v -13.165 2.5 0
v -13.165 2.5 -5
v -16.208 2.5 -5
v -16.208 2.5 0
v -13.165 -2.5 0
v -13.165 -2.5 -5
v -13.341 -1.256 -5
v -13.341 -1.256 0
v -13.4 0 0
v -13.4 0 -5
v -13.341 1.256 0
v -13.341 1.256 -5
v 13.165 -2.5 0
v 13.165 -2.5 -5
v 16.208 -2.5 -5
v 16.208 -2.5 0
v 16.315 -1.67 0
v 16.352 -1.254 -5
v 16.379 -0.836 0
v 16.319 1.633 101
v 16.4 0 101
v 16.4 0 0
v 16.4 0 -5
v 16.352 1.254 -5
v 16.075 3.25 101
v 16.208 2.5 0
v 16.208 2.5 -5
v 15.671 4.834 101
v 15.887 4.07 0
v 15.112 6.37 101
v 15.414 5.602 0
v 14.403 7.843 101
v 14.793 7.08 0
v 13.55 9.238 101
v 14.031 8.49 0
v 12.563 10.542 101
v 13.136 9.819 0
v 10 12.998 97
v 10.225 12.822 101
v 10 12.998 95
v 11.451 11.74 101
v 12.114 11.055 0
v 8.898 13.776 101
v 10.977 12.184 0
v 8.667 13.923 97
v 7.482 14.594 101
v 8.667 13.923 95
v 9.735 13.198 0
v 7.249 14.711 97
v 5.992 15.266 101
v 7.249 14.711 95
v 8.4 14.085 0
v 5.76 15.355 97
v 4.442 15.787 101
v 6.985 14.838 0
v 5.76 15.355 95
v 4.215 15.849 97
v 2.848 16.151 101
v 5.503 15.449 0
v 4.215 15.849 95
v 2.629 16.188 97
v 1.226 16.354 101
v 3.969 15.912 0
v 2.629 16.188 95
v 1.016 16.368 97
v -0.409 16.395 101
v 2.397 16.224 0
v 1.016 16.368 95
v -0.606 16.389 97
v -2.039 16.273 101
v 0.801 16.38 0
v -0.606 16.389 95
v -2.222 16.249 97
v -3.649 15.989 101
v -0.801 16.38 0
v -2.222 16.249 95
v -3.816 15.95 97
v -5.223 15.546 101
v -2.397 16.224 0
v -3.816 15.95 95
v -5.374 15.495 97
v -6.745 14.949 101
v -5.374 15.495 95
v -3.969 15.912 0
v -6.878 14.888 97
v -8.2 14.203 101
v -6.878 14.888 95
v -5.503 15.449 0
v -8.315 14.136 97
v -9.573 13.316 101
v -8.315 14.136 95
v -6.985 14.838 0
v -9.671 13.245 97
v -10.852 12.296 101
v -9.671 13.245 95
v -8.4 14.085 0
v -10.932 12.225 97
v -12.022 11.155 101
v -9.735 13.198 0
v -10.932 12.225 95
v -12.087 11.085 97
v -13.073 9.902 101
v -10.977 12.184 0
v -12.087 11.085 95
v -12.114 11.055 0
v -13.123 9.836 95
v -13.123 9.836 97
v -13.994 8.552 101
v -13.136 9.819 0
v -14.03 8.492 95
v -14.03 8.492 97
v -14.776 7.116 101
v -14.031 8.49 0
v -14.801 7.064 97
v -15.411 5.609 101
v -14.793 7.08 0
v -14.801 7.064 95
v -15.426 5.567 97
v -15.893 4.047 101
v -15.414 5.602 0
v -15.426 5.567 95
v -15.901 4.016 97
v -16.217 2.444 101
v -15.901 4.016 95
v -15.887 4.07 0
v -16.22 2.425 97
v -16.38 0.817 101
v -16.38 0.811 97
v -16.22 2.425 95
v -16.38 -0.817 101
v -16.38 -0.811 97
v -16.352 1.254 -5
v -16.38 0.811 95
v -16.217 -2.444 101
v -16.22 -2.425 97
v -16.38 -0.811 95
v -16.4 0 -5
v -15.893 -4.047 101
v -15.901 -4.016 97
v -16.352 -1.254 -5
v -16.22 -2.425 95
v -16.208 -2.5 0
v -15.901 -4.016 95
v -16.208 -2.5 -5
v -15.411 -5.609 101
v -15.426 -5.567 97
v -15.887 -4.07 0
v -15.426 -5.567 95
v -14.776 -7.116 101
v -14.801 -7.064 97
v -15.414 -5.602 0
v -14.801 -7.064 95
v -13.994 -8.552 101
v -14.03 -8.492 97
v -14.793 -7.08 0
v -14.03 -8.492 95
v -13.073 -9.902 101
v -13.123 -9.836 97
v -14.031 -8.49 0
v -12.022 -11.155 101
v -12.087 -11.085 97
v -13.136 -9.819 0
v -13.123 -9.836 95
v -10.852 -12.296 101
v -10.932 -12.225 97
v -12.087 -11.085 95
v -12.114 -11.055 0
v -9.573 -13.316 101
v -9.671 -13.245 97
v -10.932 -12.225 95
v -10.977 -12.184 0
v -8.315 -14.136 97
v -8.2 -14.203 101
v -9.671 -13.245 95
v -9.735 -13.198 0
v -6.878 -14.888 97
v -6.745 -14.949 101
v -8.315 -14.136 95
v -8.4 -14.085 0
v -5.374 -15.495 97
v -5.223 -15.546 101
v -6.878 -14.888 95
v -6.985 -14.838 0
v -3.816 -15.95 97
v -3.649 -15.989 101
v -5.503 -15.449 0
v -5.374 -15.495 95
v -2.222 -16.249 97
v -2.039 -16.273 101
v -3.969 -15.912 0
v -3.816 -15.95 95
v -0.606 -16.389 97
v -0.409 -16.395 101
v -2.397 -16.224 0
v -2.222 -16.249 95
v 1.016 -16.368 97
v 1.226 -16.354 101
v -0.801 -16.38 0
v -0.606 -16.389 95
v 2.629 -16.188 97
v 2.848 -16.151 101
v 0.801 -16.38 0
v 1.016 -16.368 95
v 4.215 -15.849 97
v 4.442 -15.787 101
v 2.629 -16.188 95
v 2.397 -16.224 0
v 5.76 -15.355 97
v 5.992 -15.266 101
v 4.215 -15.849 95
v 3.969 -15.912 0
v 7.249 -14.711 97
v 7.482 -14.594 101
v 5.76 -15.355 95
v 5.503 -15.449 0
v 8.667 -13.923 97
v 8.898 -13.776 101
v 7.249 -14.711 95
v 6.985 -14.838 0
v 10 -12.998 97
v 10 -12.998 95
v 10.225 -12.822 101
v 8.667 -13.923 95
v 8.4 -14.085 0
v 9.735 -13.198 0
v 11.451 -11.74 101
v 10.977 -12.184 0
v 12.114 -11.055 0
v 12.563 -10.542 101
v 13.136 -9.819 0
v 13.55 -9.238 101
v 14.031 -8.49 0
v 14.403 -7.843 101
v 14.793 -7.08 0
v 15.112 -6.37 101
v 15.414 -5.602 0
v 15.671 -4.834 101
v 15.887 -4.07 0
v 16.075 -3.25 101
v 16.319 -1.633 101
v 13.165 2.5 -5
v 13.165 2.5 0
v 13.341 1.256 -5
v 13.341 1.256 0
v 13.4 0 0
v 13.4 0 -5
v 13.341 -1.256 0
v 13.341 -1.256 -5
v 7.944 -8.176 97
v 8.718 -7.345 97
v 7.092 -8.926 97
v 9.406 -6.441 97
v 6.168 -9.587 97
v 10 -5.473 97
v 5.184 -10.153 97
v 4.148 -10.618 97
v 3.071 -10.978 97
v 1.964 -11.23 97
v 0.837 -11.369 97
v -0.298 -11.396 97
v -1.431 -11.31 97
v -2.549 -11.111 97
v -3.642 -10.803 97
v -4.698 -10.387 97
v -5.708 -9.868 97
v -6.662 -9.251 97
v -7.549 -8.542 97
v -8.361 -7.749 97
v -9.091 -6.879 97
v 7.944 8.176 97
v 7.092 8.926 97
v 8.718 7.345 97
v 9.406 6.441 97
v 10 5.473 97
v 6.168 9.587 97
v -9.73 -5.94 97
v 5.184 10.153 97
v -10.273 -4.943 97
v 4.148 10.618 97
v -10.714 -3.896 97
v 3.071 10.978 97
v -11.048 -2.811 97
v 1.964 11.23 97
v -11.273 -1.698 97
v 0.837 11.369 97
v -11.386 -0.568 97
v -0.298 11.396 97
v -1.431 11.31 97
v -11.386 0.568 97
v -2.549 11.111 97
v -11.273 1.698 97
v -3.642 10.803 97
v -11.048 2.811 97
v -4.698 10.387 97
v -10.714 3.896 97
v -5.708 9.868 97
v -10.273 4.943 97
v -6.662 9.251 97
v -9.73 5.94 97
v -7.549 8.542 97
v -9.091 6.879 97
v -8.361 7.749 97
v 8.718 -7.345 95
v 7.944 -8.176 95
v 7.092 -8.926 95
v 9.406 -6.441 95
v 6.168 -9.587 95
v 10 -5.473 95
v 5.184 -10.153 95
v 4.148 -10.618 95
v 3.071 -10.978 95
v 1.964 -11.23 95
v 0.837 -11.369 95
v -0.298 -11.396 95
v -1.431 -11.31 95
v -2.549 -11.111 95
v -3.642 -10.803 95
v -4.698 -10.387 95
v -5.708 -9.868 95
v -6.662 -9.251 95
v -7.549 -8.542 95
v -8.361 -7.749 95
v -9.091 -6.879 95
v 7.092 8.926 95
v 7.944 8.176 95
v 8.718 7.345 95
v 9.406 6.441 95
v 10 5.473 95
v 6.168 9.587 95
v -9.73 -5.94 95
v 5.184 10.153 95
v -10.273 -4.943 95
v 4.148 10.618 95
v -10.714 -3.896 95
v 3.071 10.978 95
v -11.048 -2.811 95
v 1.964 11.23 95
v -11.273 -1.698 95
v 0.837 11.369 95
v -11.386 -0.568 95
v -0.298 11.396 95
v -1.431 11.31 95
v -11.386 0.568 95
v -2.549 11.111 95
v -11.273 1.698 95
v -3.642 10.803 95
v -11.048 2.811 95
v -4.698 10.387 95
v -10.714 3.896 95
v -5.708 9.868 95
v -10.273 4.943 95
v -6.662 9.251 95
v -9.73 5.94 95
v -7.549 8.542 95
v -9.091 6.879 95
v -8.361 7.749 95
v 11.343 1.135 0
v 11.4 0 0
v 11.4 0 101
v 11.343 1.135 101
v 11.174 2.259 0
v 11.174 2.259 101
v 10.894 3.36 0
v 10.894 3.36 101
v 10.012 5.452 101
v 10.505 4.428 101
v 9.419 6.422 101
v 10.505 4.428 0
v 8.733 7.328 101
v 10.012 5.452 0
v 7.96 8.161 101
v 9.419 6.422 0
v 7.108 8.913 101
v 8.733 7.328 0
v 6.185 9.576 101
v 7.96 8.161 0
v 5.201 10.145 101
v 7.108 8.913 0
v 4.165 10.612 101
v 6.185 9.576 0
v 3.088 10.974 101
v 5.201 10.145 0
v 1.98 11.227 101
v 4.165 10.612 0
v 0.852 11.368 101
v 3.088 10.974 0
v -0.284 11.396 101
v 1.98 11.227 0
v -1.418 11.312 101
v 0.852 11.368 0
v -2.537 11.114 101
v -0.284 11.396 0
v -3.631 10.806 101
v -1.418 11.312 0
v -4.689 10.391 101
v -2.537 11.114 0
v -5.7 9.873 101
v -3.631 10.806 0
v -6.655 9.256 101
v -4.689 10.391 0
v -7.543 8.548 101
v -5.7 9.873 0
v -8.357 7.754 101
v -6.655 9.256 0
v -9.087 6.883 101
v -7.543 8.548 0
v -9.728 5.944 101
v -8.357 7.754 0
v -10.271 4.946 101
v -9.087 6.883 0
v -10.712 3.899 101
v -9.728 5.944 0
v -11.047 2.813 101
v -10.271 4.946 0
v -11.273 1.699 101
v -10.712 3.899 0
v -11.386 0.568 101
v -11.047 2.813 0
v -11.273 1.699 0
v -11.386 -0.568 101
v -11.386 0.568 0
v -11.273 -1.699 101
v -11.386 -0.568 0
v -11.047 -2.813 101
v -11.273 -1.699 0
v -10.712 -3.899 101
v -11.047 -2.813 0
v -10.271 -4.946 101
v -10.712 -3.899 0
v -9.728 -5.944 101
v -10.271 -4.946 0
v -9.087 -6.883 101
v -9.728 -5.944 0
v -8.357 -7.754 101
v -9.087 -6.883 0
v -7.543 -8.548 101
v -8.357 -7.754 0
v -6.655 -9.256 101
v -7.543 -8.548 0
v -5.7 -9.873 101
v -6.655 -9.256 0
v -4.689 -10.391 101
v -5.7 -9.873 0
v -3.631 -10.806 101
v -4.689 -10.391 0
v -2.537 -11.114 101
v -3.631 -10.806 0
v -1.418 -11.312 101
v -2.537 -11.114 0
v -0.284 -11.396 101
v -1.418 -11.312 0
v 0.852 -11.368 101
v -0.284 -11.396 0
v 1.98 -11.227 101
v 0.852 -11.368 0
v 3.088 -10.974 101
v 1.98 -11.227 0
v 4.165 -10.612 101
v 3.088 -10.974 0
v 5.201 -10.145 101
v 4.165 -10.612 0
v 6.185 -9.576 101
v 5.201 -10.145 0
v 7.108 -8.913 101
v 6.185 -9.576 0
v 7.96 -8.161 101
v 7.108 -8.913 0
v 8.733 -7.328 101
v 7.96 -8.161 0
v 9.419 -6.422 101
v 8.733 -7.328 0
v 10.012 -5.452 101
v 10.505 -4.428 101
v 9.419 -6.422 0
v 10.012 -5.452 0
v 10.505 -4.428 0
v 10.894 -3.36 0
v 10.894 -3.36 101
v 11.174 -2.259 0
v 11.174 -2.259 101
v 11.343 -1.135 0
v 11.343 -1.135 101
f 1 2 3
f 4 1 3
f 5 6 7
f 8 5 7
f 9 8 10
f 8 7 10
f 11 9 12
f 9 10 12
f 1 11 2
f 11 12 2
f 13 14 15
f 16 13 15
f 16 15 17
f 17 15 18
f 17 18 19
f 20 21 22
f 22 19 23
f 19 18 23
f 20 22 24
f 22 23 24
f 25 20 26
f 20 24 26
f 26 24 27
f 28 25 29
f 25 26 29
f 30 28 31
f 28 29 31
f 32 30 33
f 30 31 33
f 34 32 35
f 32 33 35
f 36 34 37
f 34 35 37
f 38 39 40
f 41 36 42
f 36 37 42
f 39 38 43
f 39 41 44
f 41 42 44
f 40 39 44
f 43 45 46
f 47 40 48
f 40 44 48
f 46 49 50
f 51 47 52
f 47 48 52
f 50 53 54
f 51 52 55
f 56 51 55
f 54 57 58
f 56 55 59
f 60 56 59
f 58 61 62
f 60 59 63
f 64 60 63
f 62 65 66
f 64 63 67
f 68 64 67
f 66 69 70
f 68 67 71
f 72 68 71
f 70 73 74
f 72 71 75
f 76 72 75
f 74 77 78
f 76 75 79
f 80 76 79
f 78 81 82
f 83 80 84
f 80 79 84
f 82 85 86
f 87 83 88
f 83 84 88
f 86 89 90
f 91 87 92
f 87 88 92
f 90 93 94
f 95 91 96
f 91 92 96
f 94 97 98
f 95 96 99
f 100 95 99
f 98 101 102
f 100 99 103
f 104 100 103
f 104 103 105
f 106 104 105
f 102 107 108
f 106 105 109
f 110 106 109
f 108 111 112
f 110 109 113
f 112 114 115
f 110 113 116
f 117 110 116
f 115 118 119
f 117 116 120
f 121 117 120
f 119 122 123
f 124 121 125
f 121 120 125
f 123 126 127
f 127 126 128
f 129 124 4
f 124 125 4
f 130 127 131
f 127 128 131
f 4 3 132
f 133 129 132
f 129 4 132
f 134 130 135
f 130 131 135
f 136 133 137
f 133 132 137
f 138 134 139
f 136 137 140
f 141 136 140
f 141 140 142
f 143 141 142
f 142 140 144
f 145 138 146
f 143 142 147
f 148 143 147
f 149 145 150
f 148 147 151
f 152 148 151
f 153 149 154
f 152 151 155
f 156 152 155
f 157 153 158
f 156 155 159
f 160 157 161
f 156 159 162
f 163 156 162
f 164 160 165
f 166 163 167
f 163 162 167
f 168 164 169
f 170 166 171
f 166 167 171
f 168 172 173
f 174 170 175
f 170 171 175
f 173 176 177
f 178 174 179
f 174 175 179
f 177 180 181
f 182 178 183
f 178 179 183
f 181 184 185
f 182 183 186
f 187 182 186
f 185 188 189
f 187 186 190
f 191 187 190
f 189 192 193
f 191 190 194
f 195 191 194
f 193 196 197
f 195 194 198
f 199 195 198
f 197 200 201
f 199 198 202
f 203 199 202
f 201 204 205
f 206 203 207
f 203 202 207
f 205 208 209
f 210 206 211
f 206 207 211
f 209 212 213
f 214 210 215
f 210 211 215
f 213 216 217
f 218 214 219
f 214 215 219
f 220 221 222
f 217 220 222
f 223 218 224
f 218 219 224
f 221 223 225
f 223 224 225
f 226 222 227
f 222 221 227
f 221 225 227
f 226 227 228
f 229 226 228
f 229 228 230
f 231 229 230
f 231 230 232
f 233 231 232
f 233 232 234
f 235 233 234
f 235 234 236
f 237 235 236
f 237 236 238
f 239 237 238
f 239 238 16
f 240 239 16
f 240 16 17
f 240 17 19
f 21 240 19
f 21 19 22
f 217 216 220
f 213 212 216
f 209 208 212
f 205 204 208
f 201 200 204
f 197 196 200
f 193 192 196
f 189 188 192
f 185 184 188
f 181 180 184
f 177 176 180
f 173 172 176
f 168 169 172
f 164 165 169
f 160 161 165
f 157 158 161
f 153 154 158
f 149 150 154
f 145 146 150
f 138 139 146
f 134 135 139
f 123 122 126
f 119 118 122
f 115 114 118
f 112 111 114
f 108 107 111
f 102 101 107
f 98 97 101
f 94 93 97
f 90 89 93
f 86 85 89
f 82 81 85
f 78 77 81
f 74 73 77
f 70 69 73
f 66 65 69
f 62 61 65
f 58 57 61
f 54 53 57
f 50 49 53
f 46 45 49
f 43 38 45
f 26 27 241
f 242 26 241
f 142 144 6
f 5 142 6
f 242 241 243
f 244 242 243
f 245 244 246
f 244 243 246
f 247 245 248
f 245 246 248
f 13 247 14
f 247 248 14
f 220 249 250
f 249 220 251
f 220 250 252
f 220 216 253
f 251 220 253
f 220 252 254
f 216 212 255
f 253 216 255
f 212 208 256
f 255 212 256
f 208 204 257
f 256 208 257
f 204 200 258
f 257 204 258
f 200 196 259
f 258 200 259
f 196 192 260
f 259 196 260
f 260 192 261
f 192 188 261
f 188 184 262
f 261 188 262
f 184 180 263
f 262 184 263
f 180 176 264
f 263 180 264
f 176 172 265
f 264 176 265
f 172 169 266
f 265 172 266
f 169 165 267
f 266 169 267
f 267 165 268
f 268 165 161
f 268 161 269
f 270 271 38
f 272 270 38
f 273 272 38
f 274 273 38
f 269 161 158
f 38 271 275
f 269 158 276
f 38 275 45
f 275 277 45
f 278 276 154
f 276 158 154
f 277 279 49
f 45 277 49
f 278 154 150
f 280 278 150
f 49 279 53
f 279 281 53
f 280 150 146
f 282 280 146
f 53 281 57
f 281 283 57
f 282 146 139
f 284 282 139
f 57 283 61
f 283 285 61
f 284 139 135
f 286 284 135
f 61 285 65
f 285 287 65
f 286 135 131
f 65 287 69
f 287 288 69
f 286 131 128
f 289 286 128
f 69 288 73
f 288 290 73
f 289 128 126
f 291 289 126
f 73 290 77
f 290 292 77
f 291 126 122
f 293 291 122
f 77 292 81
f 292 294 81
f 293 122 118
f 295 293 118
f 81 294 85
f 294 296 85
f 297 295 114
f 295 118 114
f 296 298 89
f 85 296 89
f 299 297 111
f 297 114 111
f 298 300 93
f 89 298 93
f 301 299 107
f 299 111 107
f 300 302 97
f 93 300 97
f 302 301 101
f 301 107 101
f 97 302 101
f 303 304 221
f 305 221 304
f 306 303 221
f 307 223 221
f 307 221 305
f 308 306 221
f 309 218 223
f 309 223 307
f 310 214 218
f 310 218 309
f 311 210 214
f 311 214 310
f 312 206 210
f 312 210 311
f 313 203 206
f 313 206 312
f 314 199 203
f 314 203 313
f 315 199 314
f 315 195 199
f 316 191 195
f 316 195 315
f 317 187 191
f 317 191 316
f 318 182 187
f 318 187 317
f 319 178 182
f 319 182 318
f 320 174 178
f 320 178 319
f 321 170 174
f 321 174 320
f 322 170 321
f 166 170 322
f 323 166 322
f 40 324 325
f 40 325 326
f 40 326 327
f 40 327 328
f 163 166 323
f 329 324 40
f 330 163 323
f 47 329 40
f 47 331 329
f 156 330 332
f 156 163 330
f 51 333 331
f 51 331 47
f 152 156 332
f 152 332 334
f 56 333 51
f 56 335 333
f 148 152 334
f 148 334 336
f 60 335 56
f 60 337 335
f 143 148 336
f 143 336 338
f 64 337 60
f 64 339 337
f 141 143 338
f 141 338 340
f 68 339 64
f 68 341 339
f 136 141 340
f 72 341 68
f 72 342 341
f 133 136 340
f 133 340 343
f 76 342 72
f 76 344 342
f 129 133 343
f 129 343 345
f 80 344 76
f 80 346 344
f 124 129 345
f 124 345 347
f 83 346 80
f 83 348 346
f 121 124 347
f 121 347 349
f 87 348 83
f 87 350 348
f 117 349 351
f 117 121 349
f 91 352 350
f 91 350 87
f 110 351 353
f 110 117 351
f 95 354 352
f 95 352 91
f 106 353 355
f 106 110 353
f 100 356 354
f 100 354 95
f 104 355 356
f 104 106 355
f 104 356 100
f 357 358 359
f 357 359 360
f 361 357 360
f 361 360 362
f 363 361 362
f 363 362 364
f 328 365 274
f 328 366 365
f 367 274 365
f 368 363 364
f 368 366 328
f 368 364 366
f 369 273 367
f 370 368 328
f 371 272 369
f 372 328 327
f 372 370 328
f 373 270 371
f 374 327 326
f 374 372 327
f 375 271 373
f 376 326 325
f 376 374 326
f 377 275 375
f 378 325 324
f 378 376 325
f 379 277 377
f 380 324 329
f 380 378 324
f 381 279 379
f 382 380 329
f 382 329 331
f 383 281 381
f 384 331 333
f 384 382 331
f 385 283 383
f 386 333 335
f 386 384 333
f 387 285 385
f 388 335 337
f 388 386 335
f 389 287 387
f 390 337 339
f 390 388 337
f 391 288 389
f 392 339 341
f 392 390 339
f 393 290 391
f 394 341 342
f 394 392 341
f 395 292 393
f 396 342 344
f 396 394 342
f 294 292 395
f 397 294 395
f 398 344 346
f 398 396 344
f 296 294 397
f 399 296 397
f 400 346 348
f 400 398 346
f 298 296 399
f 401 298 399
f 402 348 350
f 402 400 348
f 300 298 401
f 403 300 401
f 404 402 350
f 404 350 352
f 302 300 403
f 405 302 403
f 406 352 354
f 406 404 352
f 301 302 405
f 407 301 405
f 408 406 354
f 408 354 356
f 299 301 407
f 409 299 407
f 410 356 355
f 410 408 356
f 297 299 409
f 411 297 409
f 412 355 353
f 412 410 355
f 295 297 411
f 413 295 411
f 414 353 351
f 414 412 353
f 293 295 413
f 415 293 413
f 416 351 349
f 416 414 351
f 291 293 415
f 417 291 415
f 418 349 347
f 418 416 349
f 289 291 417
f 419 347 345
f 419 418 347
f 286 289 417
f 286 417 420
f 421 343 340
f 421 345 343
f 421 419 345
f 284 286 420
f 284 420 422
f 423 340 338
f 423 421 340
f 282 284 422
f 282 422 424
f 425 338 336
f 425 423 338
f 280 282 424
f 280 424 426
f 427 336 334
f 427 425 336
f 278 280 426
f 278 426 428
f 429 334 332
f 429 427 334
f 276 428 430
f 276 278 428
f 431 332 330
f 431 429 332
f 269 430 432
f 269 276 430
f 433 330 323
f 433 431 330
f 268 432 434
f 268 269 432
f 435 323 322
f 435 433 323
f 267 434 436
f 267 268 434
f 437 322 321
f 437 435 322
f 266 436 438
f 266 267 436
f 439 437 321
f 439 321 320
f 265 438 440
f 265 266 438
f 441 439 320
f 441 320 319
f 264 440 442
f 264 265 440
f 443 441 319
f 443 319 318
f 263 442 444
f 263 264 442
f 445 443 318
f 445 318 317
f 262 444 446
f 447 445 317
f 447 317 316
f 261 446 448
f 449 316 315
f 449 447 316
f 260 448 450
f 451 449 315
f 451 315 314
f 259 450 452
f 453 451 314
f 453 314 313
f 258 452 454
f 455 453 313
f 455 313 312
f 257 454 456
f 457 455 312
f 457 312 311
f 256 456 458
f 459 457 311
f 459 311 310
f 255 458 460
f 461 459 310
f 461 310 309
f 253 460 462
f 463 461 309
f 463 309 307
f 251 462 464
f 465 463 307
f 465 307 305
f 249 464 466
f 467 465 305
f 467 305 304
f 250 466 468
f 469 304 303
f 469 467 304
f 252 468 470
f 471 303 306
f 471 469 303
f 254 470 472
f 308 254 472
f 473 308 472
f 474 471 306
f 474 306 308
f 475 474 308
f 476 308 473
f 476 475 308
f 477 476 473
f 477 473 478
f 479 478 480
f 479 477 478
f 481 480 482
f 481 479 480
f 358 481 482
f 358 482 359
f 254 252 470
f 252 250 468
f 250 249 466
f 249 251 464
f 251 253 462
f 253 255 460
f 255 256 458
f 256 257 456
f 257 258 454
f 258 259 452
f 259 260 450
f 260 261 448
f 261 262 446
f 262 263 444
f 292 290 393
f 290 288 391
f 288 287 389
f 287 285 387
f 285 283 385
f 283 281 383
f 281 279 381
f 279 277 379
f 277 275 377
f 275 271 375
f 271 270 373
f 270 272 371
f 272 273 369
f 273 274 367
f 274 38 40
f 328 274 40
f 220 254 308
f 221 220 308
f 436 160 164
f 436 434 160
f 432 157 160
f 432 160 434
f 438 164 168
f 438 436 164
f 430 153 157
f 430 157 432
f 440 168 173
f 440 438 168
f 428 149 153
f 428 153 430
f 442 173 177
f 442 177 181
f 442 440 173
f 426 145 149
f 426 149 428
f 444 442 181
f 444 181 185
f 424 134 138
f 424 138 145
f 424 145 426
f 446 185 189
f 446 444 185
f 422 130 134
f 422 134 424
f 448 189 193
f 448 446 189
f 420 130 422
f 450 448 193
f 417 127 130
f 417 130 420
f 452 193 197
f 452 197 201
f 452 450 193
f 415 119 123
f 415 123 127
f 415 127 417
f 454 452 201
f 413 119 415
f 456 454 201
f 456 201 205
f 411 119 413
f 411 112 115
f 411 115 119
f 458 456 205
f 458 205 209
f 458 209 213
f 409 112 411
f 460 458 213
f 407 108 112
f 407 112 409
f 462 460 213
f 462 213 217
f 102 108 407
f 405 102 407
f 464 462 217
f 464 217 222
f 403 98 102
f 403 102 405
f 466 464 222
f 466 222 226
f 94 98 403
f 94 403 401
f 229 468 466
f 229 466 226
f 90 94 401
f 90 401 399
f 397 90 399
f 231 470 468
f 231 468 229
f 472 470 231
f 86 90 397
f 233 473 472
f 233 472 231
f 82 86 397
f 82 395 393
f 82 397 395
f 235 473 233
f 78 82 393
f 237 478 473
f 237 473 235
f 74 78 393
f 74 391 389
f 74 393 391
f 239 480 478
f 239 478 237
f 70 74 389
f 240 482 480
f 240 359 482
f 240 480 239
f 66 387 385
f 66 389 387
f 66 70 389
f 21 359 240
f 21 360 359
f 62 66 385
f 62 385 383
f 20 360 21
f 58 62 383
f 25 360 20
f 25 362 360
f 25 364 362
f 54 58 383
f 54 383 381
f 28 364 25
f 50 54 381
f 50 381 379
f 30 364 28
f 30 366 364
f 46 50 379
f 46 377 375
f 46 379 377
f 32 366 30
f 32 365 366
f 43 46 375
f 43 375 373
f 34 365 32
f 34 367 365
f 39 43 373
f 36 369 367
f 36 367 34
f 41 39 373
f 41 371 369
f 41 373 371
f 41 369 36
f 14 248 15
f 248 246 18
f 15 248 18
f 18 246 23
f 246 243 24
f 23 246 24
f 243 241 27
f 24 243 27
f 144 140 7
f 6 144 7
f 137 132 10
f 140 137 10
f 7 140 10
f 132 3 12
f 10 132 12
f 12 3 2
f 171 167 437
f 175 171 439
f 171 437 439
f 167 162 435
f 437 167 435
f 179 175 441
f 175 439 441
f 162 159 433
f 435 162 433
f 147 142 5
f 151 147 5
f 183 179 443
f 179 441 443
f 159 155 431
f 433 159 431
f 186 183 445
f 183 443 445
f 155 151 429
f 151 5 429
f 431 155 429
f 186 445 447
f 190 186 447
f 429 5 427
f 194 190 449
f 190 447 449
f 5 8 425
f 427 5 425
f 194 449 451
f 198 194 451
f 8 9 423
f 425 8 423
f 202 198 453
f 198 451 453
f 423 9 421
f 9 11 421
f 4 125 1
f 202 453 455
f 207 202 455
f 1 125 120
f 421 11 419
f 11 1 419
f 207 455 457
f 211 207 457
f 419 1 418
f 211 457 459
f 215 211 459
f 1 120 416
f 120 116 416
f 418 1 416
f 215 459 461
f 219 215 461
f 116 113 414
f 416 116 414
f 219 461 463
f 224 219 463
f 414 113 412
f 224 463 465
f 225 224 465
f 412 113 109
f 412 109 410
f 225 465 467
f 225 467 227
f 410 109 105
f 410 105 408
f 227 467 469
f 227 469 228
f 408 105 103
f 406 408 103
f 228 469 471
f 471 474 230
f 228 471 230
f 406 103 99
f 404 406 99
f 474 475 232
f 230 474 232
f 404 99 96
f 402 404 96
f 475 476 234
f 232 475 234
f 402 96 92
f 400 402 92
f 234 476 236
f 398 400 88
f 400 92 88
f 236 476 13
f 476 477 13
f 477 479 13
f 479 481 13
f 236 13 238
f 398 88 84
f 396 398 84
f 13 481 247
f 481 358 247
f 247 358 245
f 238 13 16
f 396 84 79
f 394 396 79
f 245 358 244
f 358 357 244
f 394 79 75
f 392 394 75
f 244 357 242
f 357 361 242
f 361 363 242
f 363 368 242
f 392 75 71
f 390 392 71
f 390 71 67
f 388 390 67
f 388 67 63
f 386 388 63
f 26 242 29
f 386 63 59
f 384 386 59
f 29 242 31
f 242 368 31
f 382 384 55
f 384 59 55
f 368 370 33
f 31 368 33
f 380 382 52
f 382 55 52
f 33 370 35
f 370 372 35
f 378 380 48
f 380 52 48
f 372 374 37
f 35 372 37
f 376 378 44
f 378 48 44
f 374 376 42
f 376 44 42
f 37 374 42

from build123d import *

# Parameters (mm, degrees)
SKETCH1_R               = 16.4
SKETCH1_R_2             = 11.4
BOSS_EXTRUDE1_DEPTH     = 101
CUT_EXTRUDE1_DEPTH      = 10.0001
CUT_EXTRUDE1_DEPTH_BACK = 100
SKETCH2_W               = 2
SKETCH2_H               = 49.498063887
BOSS_EXTRUDE2_START     = 5
BOSS_EXTRUDE2_DEPTH     = 5


with BuildPart() as part:
    # Sketch1 → Boss-Extrude1 (new body)
    with BuildSketch(Plane.XY):
        Circle(SKETCH1_R)
        Circle(SKETCH1_R_2, mode=Mode.SUBTRACT)
    extrude(amount=BOSS_EXTRUDE1_DEPTH)

    # Sketch2 → Cut-Extrude1 (cut, two sides: drawn at the far end of the back side and taken through both)
    with BuildSketch(Plane(origin=(0, 0, 0), x_dir=(0, 0, -1), z_dir=(1, 0, 0)).offset(-CUT_EXTRUDE1_DEPTH_BACK)):
        with Locations((-96, 0.830504428)):
            Rectangle(SKETCH2_W, SKETCH2_H)
    extrude(amount=CUT_EXTRUDE1_DEPTH + CUT_EXTRUDE1_DEPTH_BACK, mode=Mode.SUBTRACT)

    # Sketch3 → Boss-Extrude2 (add)
    with BuildSketch(Plane(origin=(0, 0, 0), x_dir=(-1, 0, 0), z_dir=(0, 0, -1)).offset(BOSS_EXTRUDE2_START)):
        with BuildLine():
            Line((13.164725595, 2.5), (16.208331191, 2.5))
            ThreePointArc((16.208331191, 2.5), (16.4, 0), (16.208331191, -2.5))
            Line((16.208331191, -2.5), (13.164725595, -2.5))
            ThreePointArc((13.164725595, -2.5), (13.4, 0), (13.164725595, 2.5))
        make_face()
        with BuildLine():
            Line((-16.208331191, 2.5), (-13.164725595, 2.5))
            ThreePointArc((-13.164725595, 2.5), (-13.4, 0), (-13.164725595, -2.5))
            Line((-13.164725595, -2.5), (-16.208331191, -2.5))
            ThreePointArc((-16.208331191, -2.5), (-16.4, 0), (-16.208331191, 2.5))
        make_face()
    extrude(amount=-BOSS_EXTRUDE2_DEPTH)


solid = part.part
